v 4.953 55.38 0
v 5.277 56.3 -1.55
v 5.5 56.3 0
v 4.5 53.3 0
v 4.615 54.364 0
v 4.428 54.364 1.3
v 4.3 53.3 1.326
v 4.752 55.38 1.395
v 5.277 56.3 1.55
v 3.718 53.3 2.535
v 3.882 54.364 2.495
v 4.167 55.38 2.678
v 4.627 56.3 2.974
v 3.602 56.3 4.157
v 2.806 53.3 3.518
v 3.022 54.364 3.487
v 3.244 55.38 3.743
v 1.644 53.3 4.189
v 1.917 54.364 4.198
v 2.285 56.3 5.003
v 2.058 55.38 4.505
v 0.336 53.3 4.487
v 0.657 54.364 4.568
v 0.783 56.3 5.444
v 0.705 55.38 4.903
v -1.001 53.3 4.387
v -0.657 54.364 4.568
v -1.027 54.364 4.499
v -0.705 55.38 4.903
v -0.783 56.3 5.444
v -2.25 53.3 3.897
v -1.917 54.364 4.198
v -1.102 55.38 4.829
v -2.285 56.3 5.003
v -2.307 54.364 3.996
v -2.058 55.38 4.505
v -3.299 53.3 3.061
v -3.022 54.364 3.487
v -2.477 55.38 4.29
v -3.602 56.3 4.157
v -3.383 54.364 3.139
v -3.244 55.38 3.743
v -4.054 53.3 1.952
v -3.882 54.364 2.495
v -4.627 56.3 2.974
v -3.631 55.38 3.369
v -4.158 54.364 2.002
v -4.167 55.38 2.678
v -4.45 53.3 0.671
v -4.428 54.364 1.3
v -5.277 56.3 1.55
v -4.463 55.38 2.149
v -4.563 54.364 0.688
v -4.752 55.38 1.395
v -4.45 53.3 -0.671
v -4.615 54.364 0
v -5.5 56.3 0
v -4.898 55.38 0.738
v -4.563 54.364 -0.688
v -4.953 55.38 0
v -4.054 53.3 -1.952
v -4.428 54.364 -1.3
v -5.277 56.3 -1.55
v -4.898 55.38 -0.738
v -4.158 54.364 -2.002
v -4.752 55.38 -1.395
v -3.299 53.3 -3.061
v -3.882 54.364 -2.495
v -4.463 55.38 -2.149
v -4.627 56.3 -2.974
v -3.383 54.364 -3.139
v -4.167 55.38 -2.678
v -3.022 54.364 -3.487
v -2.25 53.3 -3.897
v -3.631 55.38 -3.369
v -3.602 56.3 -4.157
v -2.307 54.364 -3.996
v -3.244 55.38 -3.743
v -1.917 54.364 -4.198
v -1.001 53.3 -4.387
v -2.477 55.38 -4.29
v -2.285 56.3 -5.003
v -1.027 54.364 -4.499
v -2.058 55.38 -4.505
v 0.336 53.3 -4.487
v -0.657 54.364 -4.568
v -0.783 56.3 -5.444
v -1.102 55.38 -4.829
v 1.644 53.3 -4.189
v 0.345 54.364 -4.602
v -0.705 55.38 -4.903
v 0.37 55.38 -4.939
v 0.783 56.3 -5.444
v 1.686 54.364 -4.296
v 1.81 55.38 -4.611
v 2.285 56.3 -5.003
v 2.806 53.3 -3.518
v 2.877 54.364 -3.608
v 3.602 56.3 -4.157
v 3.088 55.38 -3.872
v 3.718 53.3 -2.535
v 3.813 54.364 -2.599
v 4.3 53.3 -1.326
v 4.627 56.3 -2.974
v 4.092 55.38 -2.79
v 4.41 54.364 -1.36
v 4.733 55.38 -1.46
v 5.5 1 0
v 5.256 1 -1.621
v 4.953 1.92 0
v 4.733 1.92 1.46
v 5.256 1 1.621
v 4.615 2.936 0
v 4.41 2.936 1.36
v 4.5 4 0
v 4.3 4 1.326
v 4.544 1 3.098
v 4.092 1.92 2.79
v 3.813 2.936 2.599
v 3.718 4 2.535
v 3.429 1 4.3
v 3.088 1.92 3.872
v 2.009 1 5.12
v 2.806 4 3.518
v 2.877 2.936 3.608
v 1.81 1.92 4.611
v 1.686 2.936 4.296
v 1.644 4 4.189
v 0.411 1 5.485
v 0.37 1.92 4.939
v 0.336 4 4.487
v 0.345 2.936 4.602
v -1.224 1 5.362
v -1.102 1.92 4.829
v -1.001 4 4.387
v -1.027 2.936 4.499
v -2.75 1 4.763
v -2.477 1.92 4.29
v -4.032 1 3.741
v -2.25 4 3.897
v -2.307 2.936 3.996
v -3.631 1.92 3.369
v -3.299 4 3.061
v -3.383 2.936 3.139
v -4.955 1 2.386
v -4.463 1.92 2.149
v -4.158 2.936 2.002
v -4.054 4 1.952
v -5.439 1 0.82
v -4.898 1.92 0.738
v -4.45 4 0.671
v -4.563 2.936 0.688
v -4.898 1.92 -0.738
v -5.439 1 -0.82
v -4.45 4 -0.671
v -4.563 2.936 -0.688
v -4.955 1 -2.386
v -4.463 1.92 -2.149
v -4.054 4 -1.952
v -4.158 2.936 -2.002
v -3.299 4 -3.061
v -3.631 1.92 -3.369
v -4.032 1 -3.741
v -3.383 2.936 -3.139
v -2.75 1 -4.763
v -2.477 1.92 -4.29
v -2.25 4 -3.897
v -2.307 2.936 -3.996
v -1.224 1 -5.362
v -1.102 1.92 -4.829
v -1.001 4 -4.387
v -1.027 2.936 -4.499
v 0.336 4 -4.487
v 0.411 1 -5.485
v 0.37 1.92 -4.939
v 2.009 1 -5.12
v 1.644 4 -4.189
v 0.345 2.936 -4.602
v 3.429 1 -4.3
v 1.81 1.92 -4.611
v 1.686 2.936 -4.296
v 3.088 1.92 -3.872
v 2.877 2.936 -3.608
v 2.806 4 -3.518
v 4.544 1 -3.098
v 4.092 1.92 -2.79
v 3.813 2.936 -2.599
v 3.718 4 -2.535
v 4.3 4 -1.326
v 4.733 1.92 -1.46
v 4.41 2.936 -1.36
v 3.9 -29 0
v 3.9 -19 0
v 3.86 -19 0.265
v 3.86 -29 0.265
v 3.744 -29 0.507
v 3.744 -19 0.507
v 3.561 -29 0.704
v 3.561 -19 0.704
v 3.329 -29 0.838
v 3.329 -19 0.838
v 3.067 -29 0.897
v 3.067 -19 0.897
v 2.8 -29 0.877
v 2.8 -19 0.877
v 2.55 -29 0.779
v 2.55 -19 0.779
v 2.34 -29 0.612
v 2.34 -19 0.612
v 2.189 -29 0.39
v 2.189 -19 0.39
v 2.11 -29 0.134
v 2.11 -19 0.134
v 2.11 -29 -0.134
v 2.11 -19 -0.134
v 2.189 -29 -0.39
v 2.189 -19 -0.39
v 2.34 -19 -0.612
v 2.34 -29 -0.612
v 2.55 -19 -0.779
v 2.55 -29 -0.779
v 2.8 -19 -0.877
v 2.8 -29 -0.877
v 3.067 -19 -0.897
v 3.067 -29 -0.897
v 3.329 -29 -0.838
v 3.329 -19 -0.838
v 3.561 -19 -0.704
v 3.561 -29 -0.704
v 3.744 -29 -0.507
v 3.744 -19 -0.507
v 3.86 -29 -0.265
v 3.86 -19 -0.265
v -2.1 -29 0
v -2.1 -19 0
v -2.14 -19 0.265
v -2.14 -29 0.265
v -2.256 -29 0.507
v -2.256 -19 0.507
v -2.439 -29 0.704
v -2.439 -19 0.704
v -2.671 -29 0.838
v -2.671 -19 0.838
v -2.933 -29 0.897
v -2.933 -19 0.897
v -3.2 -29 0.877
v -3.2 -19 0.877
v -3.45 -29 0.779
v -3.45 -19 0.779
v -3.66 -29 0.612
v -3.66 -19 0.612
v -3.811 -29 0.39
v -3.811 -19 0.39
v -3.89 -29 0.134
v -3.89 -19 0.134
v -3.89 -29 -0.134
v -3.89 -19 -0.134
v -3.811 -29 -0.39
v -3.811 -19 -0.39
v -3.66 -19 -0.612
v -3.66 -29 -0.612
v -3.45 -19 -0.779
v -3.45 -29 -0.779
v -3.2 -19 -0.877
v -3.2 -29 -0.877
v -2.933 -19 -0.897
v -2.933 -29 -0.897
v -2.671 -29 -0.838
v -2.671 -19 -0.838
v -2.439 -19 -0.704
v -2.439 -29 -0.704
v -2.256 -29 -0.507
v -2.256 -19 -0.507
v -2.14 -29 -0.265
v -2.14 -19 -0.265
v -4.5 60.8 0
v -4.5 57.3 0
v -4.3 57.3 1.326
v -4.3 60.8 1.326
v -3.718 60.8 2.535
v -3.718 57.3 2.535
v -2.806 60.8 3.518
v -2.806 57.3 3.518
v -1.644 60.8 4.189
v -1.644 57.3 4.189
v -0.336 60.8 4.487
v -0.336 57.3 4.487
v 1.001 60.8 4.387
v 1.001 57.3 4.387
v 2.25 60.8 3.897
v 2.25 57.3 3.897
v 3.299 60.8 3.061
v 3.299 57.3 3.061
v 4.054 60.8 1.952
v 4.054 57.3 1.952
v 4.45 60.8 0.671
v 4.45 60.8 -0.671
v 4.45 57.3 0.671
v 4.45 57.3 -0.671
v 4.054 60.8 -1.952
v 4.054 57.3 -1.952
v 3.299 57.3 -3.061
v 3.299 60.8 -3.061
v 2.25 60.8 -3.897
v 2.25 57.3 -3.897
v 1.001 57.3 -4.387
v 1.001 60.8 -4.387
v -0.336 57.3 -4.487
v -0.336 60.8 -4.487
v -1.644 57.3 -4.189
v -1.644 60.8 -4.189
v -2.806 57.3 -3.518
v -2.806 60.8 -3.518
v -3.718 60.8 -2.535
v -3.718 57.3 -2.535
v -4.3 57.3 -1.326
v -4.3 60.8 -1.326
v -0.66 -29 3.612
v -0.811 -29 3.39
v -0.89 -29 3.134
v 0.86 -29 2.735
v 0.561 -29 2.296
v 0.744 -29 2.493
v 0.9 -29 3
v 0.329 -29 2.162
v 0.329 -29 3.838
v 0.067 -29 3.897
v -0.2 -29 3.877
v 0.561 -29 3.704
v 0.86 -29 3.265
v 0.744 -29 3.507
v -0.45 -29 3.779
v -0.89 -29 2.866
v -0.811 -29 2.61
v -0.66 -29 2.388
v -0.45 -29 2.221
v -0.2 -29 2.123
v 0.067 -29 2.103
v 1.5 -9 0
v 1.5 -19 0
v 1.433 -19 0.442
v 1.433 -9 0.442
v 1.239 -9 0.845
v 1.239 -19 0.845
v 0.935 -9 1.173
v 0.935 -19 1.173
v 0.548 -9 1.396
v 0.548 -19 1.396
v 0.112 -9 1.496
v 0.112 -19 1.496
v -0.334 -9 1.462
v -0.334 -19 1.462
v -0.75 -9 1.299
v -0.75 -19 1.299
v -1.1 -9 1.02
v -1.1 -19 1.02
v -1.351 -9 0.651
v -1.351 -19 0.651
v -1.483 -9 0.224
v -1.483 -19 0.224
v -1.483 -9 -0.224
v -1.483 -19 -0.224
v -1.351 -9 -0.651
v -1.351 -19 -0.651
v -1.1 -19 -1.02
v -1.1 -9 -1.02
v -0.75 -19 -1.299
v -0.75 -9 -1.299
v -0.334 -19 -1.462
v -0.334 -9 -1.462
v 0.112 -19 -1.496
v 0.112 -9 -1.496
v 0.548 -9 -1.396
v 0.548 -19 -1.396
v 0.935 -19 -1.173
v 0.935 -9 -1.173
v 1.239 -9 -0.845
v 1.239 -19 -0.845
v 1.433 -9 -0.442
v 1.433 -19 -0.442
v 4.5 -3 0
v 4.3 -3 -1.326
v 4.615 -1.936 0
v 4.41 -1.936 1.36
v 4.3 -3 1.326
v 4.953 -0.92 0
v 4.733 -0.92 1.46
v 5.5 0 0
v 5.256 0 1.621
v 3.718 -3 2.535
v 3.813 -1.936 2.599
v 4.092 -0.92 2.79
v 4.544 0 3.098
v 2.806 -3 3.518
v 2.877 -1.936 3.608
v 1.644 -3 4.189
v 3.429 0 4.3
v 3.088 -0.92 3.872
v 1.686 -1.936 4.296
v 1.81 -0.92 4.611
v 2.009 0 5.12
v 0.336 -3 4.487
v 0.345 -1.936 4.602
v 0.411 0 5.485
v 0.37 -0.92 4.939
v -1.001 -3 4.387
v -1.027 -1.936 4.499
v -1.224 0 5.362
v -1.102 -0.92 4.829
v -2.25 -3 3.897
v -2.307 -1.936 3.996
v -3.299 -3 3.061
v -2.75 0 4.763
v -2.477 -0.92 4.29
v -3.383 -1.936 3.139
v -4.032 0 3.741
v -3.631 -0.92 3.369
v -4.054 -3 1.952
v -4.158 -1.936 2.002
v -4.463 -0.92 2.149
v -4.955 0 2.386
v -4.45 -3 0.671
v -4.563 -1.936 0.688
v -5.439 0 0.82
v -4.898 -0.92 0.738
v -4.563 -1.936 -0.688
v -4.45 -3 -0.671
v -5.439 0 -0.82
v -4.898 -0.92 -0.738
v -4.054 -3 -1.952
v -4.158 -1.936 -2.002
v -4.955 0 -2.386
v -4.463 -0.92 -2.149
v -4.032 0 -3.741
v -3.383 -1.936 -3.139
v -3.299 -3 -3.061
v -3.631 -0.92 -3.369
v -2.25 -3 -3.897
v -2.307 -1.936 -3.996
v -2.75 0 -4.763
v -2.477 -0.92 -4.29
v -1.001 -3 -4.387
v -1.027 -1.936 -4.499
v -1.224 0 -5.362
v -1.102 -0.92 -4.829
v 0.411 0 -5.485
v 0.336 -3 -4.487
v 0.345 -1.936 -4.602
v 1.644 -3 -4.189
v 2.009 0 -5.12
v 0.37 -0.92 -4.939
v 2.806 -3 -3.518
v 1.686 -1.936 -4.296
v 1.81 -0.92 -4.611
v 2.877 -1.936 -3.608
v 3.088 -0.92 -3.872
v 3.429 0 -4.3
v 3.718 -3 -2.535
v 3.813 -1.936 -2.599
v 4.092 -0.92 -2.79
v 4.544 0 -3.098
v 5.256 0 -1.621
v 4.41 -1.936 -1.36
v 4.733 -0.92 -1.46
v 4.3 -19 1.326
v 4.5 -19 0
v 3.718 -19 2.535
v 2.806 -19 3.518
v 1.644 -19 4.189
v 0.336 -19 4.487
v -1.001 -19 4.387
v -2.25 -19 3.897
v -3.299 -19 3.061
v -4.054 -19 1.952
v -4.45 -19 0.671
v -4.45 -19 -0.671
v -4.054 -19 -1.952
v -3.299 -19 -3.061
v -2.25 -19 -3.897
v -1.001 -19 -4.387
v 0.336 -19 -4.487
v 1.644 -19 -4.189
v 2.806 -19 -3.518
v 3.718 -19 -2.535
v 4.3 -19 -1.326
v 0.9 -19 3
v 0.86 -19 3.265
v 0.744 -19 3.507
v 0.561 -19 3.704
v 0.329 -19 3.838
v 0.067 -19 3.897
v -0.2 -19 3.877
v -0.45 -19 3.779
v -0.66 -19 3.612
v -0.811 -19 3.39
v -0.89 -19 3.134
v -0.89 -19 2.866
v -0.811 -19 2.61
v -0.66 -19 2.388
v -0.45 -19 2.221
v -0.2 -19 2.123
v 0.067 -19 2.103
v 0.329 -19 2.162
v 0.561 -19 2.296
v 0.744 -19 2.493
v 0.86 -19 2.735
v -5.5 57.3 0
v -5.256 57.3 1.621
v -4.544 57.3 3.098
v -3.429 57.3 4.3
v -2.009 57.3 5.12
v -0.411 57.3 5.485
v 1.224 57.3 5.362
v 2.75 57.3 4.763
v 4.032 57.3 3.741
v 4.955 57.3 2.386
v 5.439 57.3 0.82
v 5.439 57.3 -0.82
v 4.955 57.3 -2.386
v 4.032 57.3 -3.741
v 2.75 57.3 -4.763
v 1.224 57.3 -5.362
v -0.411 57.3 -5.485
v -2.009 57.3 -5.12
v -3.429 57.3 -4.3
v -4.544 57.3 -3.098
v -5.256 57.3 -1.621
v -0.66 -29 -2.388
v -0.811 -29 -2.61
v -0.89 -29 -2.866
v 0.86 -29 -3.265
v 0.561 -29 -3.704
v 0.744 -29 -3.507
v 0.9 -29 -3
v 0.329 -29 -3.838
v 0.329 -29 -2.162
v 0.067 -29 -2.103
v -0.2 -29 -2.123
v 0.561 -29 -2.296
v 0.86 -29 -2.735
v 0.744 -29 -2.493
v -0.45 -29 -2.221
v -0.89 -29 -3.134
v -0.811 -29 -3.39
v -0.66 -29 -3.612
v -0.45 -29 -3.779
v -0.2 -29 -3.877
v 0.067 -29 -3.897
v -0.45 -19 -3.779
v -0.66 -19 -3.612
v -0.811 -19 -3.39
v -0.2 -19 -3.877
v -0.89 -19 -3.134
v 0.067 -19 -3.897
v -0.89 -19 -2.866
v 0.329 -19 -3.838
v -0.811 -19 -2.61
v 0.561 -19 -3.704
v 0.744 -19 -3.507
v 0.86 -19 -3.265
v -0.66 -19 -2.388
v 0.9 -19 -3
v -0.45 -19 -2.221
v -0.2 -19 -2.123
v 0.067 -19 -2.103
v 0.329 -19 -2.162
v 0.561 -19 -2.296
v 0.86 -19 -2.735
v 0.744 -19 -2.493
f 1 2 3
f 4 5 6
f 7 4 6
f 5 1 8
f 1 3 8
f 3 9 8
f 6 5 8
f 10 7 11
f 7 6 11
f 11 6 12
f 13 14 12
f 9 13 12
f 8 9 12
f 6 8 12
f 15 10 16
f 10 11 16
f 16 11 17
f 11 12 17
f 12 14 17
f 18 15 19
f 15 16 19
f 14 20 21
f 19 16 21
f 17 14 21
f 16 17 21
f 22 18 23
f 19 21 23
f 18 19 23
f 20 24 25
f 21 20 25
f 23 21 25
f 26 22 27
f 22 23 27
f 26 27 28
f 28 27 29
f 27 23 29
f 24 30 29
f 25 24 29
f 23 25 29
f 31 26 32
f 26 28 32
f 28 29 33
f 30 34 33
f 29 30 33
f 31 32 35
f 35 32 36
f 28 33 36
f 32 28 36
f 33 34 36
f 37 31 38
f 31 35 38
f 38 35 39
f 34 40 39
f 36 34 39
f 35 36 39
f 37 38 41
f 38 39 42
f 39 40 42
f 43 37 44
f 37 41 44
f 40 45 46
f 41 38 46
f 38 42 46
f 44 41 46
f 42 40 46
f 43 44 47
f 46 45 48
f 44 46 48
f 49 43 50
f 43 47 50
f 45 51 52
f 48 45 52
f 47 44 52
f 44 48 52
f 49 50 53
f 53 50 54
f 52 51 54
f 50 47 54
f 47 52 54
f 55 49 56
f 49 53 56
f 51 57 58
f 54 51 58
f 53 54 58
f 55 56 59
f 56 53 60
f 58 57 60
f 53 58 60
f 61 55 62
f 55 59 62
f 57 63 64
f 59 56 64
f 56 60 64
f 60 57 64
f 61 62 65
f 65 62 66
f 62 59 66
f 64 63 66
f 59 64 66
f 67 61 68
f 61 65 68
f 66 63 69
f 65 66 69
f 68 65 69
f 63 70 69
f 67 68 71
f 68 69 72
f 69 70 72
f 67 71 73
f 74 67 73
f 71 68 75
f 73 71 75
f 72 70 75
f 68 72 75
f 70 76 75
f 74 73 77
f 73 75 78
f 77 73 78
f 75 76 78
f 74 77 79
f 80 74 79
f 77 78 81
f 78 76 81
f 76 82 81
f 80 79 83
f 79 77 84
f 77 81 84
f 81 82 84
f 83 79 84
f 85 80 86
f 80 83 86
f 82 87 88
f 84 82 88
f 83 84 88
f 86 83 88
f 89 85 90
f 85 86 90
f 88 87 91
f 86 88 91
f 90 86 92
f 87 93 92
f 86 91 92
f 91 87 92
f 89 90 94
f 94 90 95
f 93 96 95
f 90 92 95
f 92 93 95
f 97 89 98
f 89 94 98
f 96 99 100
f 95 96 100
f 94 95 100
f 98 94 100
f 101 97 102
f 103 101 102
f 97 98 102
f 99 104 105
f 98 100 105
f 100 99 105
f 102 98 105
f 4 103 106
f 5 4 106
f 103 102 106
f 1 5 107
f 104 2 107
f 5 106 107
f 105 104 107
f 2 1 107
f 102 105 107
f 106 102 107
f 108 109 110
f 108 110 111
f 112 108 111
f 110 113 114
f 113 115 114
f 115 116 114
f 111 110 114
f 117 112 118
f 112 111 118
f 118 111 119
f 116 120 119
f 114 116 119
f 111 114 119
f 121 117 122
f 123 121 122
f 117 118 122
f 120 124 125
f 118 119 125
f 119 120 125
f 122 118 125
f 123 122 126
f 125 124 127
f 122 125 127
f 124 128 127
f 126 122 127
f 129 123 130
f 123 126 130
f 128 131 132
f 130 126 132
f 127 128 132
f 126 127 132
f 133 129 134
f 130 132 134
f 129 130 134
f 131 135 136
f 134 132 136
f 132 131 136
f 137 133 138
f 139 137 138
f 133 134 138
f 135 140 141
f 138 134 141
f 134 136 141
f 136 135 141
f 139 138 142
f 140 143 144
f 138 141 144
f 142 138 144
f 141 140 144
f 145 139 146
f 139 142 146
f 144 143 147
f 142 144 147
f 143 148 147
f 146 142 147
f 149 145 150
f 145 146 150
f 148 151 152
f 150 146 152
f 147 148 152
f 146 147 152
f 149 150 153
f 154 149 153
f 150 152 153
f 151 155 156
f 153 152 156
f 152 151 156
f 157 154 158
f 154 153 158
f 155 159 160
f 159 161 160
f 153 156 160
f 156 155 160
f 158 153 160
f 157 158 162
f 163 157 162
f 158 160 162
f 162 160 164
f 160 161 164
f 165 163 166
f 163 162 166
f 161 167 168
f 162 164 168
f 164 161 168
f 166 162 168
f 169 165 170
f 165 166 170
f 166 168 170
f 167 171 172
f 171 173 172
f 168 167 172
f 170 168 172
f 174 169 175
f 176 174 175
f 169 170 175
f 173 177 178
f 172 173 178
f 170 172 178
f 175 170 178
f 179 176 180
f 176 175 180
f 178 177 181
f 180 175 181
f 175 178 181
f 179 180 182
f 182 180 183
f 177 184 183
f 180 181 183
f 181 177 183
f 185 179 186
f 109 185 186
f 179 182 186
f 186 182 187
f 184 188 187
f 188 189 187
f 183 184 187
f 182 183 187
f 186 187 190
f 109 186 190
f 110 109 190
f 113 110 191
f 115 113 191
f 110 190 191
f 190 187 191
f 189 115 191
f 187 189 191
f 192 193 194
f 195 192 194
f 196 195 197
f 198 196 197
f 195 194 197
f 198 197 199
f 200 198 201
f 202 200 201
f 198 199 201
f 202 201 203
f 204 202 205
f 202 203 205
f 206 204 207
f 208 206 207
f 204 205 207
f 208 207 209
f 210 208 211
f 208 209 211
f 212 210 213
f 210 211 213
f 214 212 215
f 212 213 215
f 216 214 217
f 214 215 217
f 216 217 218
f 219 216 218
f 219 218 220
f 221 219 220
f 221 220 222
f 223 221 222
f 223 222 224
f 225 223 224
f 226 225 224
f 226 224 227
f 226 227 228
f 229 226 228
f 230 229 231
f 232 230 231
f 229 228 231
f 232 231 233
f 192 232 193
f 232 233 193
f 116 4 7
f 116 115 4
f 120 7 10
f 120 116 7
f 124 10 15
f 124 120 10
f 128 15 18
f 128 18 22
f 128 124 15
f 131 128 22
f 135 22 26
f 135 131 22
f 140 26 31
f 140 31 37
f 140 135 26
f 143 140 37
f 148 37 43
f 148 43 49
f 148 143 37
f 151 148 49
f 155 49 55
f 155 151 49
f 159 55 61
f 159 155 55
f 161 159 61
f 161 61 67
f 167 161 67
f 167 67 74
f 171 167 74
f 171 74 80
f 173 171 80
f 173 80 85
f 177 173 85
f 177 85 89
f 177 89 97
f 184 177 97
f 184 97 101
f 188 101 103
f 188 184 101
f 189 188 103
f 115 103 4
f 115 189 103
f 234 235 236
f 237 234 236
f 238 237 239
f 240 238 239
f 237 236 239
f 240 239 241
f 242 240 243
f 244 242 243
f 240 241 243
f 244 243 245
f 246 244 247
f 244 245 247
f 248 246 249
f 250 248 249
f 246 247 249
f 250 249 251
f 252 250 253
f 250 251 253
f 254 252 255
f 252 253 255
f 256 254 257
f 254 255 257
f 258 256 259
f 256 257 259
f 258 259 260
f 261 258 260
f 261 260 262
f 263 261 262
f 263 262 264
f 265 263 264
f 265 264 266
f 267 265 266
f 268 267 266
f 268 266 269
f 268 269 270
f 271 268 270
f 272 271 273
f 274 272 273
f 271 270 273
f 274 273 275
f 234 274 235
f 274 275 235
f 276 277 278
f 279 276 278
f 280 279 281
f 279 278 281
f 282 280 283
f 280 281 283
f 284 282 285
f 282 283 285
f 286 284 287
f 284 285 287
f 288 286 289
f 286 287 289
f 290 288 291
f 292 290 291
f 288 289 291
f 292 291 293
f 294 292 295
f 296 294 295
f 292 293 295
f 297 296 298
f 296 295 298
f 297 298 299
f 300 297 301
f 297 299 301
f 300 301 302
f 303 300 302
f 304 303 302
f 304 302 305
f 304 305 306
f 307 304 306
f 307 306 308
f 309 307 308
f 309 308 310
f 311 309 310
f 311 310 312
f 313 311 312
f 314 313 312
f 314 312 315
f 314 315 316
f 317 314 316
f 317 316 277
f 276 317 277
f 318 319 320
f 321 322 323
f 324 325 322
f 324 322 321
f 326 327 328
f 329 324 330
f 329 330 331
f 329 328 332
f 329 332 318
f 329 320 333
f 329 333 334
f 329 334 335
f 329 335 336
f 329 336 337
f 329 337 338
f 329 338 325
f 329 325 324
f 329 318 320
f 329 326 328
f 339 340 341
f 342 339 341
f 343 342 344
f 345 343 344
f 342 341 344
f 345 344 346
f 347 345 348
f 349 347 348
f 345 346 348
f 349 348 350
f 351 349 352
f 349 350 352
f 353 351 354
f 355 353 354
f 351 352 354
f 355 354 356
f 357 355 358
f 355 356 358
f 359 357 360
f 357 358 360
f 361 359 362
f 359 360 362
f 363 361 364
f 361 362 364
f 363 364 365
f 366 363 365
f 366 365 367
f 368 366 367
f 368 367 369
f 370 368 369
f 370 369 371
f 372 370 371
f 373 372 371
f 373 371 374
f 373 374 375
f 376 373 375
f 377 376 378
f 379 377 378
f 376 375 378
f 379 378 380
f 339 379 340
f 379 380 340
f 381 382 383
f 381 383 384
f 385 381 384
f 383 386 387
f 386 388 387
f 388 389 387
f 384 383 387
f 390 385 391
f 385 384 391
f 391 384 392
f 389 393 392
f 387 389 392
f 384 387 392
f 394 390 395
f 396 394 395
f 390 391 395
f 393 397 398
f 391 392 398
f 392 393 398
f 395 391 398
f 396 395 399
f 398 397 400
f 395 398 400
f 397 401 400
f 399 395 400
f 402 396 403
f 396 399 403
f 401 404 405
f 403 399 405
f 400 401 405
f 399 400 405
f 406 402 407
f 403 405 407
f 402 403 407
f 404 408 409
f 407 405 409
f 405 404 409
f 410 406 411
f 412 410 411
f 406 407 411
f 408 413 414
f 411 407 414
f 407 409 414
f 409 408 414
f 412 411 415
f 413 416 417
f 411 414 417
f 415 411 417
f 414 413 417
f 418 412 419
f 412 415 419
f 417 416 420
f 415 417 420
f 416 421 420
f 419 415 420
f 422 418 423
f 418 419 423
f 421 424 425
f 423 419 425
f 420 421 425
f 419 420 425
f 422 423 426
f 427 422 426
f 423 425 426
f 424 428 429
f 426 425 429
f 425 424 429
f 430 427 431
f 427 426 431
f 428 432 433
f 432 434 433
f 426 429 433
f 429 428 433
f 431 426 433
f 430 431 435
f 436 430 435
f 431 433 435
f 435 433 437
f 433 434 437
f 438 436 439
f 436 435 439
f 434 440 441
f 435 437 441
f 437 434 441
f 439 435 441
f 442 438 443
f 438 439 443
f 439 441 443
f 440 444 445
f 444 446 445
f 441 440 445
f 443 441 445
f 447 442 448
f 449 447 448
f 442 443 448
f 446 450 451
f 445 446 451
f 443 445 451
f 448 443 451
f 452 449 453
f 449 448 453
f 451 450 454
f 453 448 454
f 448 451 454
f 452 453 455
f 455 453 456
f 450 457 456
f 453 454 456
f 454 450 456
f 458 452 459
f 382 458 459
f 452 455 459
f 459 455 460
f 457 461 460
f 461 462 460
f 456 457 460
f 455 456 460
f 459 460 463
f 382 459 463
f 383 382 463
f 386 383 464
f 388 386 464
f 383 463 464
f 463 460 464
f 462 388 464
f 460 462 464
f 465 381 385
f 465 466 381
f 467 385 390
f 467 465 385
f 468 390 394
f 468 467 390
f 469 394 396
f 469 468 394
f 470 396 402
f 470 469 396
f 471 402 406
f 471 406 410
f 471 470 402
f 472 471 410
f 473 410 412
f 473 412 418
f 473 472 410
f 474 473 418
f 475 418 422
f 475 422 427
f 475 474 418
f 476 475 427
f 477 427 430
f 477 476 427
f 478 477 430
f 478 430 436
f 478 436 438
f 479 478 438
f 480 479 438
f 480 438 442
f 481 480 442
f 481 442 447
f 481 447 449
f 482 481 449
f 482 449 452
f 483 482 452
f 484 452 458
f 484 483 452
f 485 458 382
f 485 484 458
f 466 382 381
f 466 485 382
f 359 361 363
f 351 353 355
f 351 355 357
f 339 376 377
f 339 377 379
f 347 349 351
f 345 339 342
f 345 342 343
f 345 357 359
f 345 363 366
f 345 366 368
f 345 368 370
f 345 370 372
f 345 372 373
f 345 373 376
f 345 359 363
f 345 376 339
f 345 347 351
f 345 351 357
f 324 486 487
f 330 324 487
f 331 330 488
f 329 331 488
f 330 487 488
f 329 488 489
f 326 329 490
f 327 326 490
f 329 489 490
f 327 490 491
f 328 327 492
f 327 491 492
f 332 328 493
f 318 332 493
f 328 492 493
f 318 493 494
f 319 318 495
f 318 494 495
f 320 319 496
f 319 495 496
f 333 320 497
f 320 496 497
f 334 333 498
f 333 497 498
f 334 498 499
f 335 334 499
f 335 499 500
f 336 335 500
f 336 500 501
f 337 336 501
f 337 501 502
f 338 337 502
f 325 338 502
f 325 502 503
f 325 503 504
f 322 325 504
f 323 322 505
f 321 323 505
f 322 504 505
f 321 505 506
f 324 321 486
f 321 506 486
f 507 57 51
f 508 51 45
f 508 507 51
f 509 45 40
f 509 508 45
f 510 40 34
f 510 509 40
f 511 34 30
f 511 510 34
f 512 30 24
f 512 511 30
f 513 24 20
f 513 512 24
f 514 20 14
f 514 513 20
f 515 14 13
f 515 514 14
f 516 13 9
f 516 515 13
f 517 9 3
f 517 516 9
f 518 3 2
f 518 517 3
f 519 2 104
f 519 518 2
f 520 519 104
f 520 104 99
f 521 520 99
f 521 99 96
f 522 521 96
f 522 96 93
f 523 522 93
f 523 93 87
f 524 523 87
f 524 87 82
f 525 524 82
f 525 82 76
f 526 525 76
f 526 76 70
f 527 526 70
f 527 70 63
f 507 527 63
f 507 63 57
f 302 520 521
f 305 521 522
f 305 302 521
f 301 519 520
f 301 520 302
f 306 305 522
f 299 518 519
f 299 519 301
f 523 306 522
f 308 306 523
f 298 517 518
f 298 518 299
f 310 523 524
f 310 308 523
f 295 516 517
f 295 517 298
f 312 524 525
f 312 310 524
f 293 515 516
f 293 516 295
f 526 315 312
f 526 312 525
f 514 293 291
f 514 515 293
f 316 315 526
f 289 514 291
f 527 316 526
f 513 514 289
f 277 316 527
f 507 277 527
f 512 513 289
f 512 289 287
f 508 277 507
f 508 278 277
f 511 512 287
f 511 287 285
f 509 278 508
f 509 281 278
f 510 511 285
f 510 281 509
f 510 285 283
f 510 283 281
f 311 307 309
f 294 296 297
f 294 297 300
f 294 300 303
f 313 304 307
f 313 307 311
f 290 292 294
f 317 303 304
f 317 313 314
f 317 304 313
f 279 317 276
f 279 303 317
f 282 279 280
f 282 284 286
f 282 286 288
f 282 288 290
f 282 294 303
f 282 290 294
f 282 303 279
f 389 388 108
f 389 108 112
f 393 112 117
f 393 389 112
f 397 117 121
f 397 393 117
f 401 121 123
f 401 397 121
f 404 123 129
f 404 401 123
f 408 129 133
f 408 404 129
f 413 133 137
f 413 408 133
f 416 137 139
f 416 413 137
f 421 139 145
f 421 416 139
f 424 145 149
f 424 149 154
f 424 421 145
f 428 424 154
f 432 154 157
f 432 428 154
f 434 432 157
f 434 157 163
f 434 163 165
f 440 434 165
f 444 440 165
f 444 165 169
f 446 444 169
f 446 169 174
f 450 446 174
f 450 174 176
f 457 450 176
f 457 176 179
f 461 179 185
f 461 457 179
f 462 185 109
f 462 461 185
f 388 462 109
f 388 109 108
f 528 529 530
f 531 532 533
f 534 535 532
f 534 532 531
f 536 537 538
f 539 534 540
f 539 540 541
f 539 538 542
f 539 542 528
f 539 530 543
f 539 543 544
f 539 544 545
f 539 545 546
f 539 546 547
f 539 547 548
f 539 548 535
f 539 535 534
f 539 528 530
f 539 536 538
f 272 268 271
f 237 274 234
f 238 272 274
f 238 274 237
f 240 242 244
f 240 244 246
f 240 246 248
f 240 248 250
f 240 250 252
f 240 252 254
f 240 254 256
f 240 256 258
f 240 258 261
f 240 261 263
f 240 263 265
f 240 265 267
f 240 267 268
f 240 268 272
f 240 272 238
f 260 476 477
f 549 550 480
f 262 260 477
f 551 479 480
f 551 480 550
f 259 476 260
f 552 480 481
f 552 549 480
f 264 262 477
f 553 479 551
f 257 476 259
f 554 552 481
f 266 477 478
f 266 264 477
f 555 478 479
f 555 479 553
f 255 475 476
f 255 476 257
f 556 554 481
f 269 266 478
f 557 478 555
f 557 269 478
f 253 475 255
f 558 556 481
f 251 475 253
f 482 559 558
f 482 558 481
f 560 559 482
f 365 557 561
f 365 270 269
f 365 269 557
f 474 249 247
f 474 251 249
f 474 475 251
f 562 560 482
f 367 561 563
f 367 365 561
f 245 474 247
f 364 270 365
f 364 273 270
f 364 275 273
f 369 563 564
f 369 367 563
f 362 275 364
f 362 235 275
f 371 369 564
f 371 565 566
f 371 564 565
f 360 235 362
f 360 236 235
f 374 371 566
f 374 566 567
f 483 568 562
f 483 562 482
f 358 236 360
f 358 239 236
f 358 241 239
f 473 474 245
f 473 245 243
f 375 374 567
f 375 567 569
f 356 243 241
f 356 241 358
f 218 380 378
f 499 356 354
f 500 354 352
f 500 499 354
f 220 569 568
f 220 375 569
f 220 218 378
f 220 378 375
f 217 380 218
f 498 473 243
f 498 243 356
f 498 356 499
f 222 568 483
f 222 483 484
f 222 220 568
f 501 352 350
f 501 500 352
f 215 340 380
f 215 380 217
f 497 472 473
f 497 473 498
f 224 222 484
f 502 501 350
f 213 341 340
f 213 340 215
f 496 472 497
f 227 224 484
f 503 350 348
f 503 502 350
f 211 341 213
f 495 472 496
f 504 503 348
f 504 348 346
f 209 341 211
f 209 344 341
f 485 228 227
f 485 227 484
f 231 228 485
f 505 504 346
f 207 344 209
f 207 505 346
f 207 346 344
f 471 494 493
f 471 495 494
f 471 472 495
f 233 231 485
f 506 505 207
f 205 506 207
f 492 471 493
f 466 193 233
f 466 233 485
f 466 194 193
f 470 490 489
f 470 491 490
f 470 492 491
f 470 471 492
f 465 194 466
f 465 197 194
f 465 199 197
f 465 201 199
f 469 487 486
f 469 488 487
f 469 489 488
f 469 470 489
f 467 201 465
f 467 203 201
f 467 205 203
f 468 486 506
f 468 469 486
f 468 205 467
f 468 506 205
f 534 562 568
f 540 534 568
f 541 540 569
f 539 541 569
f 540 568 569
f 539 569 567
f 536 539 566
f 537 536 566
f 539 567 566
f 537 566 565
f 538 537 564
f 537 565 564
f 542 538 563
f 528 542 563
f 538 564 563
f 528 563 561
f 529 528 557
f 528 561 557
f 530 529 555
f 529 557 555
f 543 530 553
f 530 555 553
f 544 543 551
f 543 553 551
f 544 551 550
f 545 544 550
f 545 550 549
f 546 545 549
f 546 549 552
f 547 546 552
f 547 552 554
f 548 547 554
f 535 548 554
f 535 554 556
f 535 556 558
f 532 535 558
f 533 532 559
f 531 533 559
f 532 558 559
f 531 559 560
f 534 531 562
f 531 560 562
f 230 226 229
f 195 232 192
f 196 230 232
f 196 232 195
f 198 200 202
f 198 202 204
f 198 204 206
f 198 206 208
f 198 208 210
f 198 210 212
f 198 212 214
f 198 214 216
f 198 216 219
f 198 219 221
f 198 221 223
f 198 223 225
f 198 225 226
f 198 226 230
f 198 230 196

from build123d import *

# Parameters (mm, degrees)
F0_R      = 4.5
F1_DEPTH  = 19
F2_DEPTH  = 57.3
F3_R      = 5.5
F4_DEPTH  = 1
F6_R      = 1.5
F7_DEPTH  = 10
F8_R      = 0.9
F9_DEPTH  = 10
F10_R     = 4.5
F12_DEPTH = 3.5
F11_R     = 5.5
F11_R_2   = 4.5
F13_DEPTH = 1


# Not quite as in the source:
# - a fillet or chamfer that OpenCascade refuses, or shapes differently, is made with other operations: its cross-section is extruded or revolved along the edge and cut away or added


with BuildPart() as f1:
    # F0 (on Front) → F1 (new body)
    with BuildSketch(Plane.XZ):
        Circle(F0_R)
    extrude(amount=F1_DEPTH)

    # F2 (add): a face of the model
    f2_faces = [f1.faces().sort_by_distance(p)[0] for p in [
        (0, 0, 0),
    ]]
    extrude(f2_faces, amount=F2_DEPTH)

    # F3 (on Front) → F4 (join)
    with BuildSketch(Plane.XZ):
        Circle(F3_R)
    extrude(amount=-F4_DEPTH)

    # F5: fillet of radius 5 on 2 edges, made by hand

    # F5_s1 → F5_t2 (revolve)
    with BuildSketch(Plane.XY):
        with BuildLine():
            ThreePointArc((4.5, -3), (4.7565835097, -1.4188611699), (5.5, 0))
            Line((5.5, 0), (4.5, 0))
            Line((4.5, 0), (4.5, -3))
        make_face()
    revolve(axis=Axis((0, 0, 0), (0, -1, 0)))

    # F5_s3 → F5_t4 (revolve)
    with BuildSketch(Plane.XY):
        with BuildLine():
            ThreePointArc((5.5, 1), (4.7565835097, 2.4188611699), (4.5, 4))
            Line((4.5, 4), (4.5, 1))
            Line((4.5, 1), (5.5, 1))
        make_face()
    revolve(axis=Axis((0, 1, 0), (0, -1, 0)))

    # F6 (on face) → F7 (cut)
    with BuildSketch(Plane.XZ.offset(19)):
        Circle(F6_R)
    extrude(amount=-F7_DEPTH, mode=Mode.SUBTRACT)

    # F8 (on face) → F9 (join)
    with BuildSketch(Plane.XZ.offset(19)):
        with Locations((-3, 0)):
            Circle(F8_R)
        with Locations((0, -3)):
            Circle(F8_R)
        with Locations((3, 0)):
            Circle(F8_R)
        with Locations((0, 3)):
            Circle(F8_R)
    extrude(amount=F9_DEPTH)

    # F10 (on face) → F12 (join)
    with BuildSketch(Plane(origin=(0, 57.3, 0), x_dir=(-1, 0, 0), z_dir=(0, 1, 0))):
        Circle(F10_R)
    extrude(amount=F12_DEPTH)

    # F11 (on face) → F13 (join)
    with BuildSketch(Plane(origin=(0, 57.3, 0), x_dir=(-1, 0, 0), z_dir=(0, 1, 0))):
        Circle(F11_R)
        Circle(F11_R_2, mode=Mode.SUBTRACT)
    extrude(amount=-F13_DEPTH)

    # F14: fillet of radius 5 on 1 edges, made by hand

    # F14_s1 → F14_t2 (revolve)
    with BuildSketch(Plane.XY):
        with BuildLine():
            ThreePointArc((4.5, 53.3), (4.7565835097, 54.8811388301), (5.5, 56.3))
            Line((5.5, 56.3), (4.5, 56.3))
            Line((4.5, 56.3), (4.5, 53.3))
        make_face()
    revolve(axis=Axis((0, 56.3, 0), (0, -1, 0)))


solid = f1.part
